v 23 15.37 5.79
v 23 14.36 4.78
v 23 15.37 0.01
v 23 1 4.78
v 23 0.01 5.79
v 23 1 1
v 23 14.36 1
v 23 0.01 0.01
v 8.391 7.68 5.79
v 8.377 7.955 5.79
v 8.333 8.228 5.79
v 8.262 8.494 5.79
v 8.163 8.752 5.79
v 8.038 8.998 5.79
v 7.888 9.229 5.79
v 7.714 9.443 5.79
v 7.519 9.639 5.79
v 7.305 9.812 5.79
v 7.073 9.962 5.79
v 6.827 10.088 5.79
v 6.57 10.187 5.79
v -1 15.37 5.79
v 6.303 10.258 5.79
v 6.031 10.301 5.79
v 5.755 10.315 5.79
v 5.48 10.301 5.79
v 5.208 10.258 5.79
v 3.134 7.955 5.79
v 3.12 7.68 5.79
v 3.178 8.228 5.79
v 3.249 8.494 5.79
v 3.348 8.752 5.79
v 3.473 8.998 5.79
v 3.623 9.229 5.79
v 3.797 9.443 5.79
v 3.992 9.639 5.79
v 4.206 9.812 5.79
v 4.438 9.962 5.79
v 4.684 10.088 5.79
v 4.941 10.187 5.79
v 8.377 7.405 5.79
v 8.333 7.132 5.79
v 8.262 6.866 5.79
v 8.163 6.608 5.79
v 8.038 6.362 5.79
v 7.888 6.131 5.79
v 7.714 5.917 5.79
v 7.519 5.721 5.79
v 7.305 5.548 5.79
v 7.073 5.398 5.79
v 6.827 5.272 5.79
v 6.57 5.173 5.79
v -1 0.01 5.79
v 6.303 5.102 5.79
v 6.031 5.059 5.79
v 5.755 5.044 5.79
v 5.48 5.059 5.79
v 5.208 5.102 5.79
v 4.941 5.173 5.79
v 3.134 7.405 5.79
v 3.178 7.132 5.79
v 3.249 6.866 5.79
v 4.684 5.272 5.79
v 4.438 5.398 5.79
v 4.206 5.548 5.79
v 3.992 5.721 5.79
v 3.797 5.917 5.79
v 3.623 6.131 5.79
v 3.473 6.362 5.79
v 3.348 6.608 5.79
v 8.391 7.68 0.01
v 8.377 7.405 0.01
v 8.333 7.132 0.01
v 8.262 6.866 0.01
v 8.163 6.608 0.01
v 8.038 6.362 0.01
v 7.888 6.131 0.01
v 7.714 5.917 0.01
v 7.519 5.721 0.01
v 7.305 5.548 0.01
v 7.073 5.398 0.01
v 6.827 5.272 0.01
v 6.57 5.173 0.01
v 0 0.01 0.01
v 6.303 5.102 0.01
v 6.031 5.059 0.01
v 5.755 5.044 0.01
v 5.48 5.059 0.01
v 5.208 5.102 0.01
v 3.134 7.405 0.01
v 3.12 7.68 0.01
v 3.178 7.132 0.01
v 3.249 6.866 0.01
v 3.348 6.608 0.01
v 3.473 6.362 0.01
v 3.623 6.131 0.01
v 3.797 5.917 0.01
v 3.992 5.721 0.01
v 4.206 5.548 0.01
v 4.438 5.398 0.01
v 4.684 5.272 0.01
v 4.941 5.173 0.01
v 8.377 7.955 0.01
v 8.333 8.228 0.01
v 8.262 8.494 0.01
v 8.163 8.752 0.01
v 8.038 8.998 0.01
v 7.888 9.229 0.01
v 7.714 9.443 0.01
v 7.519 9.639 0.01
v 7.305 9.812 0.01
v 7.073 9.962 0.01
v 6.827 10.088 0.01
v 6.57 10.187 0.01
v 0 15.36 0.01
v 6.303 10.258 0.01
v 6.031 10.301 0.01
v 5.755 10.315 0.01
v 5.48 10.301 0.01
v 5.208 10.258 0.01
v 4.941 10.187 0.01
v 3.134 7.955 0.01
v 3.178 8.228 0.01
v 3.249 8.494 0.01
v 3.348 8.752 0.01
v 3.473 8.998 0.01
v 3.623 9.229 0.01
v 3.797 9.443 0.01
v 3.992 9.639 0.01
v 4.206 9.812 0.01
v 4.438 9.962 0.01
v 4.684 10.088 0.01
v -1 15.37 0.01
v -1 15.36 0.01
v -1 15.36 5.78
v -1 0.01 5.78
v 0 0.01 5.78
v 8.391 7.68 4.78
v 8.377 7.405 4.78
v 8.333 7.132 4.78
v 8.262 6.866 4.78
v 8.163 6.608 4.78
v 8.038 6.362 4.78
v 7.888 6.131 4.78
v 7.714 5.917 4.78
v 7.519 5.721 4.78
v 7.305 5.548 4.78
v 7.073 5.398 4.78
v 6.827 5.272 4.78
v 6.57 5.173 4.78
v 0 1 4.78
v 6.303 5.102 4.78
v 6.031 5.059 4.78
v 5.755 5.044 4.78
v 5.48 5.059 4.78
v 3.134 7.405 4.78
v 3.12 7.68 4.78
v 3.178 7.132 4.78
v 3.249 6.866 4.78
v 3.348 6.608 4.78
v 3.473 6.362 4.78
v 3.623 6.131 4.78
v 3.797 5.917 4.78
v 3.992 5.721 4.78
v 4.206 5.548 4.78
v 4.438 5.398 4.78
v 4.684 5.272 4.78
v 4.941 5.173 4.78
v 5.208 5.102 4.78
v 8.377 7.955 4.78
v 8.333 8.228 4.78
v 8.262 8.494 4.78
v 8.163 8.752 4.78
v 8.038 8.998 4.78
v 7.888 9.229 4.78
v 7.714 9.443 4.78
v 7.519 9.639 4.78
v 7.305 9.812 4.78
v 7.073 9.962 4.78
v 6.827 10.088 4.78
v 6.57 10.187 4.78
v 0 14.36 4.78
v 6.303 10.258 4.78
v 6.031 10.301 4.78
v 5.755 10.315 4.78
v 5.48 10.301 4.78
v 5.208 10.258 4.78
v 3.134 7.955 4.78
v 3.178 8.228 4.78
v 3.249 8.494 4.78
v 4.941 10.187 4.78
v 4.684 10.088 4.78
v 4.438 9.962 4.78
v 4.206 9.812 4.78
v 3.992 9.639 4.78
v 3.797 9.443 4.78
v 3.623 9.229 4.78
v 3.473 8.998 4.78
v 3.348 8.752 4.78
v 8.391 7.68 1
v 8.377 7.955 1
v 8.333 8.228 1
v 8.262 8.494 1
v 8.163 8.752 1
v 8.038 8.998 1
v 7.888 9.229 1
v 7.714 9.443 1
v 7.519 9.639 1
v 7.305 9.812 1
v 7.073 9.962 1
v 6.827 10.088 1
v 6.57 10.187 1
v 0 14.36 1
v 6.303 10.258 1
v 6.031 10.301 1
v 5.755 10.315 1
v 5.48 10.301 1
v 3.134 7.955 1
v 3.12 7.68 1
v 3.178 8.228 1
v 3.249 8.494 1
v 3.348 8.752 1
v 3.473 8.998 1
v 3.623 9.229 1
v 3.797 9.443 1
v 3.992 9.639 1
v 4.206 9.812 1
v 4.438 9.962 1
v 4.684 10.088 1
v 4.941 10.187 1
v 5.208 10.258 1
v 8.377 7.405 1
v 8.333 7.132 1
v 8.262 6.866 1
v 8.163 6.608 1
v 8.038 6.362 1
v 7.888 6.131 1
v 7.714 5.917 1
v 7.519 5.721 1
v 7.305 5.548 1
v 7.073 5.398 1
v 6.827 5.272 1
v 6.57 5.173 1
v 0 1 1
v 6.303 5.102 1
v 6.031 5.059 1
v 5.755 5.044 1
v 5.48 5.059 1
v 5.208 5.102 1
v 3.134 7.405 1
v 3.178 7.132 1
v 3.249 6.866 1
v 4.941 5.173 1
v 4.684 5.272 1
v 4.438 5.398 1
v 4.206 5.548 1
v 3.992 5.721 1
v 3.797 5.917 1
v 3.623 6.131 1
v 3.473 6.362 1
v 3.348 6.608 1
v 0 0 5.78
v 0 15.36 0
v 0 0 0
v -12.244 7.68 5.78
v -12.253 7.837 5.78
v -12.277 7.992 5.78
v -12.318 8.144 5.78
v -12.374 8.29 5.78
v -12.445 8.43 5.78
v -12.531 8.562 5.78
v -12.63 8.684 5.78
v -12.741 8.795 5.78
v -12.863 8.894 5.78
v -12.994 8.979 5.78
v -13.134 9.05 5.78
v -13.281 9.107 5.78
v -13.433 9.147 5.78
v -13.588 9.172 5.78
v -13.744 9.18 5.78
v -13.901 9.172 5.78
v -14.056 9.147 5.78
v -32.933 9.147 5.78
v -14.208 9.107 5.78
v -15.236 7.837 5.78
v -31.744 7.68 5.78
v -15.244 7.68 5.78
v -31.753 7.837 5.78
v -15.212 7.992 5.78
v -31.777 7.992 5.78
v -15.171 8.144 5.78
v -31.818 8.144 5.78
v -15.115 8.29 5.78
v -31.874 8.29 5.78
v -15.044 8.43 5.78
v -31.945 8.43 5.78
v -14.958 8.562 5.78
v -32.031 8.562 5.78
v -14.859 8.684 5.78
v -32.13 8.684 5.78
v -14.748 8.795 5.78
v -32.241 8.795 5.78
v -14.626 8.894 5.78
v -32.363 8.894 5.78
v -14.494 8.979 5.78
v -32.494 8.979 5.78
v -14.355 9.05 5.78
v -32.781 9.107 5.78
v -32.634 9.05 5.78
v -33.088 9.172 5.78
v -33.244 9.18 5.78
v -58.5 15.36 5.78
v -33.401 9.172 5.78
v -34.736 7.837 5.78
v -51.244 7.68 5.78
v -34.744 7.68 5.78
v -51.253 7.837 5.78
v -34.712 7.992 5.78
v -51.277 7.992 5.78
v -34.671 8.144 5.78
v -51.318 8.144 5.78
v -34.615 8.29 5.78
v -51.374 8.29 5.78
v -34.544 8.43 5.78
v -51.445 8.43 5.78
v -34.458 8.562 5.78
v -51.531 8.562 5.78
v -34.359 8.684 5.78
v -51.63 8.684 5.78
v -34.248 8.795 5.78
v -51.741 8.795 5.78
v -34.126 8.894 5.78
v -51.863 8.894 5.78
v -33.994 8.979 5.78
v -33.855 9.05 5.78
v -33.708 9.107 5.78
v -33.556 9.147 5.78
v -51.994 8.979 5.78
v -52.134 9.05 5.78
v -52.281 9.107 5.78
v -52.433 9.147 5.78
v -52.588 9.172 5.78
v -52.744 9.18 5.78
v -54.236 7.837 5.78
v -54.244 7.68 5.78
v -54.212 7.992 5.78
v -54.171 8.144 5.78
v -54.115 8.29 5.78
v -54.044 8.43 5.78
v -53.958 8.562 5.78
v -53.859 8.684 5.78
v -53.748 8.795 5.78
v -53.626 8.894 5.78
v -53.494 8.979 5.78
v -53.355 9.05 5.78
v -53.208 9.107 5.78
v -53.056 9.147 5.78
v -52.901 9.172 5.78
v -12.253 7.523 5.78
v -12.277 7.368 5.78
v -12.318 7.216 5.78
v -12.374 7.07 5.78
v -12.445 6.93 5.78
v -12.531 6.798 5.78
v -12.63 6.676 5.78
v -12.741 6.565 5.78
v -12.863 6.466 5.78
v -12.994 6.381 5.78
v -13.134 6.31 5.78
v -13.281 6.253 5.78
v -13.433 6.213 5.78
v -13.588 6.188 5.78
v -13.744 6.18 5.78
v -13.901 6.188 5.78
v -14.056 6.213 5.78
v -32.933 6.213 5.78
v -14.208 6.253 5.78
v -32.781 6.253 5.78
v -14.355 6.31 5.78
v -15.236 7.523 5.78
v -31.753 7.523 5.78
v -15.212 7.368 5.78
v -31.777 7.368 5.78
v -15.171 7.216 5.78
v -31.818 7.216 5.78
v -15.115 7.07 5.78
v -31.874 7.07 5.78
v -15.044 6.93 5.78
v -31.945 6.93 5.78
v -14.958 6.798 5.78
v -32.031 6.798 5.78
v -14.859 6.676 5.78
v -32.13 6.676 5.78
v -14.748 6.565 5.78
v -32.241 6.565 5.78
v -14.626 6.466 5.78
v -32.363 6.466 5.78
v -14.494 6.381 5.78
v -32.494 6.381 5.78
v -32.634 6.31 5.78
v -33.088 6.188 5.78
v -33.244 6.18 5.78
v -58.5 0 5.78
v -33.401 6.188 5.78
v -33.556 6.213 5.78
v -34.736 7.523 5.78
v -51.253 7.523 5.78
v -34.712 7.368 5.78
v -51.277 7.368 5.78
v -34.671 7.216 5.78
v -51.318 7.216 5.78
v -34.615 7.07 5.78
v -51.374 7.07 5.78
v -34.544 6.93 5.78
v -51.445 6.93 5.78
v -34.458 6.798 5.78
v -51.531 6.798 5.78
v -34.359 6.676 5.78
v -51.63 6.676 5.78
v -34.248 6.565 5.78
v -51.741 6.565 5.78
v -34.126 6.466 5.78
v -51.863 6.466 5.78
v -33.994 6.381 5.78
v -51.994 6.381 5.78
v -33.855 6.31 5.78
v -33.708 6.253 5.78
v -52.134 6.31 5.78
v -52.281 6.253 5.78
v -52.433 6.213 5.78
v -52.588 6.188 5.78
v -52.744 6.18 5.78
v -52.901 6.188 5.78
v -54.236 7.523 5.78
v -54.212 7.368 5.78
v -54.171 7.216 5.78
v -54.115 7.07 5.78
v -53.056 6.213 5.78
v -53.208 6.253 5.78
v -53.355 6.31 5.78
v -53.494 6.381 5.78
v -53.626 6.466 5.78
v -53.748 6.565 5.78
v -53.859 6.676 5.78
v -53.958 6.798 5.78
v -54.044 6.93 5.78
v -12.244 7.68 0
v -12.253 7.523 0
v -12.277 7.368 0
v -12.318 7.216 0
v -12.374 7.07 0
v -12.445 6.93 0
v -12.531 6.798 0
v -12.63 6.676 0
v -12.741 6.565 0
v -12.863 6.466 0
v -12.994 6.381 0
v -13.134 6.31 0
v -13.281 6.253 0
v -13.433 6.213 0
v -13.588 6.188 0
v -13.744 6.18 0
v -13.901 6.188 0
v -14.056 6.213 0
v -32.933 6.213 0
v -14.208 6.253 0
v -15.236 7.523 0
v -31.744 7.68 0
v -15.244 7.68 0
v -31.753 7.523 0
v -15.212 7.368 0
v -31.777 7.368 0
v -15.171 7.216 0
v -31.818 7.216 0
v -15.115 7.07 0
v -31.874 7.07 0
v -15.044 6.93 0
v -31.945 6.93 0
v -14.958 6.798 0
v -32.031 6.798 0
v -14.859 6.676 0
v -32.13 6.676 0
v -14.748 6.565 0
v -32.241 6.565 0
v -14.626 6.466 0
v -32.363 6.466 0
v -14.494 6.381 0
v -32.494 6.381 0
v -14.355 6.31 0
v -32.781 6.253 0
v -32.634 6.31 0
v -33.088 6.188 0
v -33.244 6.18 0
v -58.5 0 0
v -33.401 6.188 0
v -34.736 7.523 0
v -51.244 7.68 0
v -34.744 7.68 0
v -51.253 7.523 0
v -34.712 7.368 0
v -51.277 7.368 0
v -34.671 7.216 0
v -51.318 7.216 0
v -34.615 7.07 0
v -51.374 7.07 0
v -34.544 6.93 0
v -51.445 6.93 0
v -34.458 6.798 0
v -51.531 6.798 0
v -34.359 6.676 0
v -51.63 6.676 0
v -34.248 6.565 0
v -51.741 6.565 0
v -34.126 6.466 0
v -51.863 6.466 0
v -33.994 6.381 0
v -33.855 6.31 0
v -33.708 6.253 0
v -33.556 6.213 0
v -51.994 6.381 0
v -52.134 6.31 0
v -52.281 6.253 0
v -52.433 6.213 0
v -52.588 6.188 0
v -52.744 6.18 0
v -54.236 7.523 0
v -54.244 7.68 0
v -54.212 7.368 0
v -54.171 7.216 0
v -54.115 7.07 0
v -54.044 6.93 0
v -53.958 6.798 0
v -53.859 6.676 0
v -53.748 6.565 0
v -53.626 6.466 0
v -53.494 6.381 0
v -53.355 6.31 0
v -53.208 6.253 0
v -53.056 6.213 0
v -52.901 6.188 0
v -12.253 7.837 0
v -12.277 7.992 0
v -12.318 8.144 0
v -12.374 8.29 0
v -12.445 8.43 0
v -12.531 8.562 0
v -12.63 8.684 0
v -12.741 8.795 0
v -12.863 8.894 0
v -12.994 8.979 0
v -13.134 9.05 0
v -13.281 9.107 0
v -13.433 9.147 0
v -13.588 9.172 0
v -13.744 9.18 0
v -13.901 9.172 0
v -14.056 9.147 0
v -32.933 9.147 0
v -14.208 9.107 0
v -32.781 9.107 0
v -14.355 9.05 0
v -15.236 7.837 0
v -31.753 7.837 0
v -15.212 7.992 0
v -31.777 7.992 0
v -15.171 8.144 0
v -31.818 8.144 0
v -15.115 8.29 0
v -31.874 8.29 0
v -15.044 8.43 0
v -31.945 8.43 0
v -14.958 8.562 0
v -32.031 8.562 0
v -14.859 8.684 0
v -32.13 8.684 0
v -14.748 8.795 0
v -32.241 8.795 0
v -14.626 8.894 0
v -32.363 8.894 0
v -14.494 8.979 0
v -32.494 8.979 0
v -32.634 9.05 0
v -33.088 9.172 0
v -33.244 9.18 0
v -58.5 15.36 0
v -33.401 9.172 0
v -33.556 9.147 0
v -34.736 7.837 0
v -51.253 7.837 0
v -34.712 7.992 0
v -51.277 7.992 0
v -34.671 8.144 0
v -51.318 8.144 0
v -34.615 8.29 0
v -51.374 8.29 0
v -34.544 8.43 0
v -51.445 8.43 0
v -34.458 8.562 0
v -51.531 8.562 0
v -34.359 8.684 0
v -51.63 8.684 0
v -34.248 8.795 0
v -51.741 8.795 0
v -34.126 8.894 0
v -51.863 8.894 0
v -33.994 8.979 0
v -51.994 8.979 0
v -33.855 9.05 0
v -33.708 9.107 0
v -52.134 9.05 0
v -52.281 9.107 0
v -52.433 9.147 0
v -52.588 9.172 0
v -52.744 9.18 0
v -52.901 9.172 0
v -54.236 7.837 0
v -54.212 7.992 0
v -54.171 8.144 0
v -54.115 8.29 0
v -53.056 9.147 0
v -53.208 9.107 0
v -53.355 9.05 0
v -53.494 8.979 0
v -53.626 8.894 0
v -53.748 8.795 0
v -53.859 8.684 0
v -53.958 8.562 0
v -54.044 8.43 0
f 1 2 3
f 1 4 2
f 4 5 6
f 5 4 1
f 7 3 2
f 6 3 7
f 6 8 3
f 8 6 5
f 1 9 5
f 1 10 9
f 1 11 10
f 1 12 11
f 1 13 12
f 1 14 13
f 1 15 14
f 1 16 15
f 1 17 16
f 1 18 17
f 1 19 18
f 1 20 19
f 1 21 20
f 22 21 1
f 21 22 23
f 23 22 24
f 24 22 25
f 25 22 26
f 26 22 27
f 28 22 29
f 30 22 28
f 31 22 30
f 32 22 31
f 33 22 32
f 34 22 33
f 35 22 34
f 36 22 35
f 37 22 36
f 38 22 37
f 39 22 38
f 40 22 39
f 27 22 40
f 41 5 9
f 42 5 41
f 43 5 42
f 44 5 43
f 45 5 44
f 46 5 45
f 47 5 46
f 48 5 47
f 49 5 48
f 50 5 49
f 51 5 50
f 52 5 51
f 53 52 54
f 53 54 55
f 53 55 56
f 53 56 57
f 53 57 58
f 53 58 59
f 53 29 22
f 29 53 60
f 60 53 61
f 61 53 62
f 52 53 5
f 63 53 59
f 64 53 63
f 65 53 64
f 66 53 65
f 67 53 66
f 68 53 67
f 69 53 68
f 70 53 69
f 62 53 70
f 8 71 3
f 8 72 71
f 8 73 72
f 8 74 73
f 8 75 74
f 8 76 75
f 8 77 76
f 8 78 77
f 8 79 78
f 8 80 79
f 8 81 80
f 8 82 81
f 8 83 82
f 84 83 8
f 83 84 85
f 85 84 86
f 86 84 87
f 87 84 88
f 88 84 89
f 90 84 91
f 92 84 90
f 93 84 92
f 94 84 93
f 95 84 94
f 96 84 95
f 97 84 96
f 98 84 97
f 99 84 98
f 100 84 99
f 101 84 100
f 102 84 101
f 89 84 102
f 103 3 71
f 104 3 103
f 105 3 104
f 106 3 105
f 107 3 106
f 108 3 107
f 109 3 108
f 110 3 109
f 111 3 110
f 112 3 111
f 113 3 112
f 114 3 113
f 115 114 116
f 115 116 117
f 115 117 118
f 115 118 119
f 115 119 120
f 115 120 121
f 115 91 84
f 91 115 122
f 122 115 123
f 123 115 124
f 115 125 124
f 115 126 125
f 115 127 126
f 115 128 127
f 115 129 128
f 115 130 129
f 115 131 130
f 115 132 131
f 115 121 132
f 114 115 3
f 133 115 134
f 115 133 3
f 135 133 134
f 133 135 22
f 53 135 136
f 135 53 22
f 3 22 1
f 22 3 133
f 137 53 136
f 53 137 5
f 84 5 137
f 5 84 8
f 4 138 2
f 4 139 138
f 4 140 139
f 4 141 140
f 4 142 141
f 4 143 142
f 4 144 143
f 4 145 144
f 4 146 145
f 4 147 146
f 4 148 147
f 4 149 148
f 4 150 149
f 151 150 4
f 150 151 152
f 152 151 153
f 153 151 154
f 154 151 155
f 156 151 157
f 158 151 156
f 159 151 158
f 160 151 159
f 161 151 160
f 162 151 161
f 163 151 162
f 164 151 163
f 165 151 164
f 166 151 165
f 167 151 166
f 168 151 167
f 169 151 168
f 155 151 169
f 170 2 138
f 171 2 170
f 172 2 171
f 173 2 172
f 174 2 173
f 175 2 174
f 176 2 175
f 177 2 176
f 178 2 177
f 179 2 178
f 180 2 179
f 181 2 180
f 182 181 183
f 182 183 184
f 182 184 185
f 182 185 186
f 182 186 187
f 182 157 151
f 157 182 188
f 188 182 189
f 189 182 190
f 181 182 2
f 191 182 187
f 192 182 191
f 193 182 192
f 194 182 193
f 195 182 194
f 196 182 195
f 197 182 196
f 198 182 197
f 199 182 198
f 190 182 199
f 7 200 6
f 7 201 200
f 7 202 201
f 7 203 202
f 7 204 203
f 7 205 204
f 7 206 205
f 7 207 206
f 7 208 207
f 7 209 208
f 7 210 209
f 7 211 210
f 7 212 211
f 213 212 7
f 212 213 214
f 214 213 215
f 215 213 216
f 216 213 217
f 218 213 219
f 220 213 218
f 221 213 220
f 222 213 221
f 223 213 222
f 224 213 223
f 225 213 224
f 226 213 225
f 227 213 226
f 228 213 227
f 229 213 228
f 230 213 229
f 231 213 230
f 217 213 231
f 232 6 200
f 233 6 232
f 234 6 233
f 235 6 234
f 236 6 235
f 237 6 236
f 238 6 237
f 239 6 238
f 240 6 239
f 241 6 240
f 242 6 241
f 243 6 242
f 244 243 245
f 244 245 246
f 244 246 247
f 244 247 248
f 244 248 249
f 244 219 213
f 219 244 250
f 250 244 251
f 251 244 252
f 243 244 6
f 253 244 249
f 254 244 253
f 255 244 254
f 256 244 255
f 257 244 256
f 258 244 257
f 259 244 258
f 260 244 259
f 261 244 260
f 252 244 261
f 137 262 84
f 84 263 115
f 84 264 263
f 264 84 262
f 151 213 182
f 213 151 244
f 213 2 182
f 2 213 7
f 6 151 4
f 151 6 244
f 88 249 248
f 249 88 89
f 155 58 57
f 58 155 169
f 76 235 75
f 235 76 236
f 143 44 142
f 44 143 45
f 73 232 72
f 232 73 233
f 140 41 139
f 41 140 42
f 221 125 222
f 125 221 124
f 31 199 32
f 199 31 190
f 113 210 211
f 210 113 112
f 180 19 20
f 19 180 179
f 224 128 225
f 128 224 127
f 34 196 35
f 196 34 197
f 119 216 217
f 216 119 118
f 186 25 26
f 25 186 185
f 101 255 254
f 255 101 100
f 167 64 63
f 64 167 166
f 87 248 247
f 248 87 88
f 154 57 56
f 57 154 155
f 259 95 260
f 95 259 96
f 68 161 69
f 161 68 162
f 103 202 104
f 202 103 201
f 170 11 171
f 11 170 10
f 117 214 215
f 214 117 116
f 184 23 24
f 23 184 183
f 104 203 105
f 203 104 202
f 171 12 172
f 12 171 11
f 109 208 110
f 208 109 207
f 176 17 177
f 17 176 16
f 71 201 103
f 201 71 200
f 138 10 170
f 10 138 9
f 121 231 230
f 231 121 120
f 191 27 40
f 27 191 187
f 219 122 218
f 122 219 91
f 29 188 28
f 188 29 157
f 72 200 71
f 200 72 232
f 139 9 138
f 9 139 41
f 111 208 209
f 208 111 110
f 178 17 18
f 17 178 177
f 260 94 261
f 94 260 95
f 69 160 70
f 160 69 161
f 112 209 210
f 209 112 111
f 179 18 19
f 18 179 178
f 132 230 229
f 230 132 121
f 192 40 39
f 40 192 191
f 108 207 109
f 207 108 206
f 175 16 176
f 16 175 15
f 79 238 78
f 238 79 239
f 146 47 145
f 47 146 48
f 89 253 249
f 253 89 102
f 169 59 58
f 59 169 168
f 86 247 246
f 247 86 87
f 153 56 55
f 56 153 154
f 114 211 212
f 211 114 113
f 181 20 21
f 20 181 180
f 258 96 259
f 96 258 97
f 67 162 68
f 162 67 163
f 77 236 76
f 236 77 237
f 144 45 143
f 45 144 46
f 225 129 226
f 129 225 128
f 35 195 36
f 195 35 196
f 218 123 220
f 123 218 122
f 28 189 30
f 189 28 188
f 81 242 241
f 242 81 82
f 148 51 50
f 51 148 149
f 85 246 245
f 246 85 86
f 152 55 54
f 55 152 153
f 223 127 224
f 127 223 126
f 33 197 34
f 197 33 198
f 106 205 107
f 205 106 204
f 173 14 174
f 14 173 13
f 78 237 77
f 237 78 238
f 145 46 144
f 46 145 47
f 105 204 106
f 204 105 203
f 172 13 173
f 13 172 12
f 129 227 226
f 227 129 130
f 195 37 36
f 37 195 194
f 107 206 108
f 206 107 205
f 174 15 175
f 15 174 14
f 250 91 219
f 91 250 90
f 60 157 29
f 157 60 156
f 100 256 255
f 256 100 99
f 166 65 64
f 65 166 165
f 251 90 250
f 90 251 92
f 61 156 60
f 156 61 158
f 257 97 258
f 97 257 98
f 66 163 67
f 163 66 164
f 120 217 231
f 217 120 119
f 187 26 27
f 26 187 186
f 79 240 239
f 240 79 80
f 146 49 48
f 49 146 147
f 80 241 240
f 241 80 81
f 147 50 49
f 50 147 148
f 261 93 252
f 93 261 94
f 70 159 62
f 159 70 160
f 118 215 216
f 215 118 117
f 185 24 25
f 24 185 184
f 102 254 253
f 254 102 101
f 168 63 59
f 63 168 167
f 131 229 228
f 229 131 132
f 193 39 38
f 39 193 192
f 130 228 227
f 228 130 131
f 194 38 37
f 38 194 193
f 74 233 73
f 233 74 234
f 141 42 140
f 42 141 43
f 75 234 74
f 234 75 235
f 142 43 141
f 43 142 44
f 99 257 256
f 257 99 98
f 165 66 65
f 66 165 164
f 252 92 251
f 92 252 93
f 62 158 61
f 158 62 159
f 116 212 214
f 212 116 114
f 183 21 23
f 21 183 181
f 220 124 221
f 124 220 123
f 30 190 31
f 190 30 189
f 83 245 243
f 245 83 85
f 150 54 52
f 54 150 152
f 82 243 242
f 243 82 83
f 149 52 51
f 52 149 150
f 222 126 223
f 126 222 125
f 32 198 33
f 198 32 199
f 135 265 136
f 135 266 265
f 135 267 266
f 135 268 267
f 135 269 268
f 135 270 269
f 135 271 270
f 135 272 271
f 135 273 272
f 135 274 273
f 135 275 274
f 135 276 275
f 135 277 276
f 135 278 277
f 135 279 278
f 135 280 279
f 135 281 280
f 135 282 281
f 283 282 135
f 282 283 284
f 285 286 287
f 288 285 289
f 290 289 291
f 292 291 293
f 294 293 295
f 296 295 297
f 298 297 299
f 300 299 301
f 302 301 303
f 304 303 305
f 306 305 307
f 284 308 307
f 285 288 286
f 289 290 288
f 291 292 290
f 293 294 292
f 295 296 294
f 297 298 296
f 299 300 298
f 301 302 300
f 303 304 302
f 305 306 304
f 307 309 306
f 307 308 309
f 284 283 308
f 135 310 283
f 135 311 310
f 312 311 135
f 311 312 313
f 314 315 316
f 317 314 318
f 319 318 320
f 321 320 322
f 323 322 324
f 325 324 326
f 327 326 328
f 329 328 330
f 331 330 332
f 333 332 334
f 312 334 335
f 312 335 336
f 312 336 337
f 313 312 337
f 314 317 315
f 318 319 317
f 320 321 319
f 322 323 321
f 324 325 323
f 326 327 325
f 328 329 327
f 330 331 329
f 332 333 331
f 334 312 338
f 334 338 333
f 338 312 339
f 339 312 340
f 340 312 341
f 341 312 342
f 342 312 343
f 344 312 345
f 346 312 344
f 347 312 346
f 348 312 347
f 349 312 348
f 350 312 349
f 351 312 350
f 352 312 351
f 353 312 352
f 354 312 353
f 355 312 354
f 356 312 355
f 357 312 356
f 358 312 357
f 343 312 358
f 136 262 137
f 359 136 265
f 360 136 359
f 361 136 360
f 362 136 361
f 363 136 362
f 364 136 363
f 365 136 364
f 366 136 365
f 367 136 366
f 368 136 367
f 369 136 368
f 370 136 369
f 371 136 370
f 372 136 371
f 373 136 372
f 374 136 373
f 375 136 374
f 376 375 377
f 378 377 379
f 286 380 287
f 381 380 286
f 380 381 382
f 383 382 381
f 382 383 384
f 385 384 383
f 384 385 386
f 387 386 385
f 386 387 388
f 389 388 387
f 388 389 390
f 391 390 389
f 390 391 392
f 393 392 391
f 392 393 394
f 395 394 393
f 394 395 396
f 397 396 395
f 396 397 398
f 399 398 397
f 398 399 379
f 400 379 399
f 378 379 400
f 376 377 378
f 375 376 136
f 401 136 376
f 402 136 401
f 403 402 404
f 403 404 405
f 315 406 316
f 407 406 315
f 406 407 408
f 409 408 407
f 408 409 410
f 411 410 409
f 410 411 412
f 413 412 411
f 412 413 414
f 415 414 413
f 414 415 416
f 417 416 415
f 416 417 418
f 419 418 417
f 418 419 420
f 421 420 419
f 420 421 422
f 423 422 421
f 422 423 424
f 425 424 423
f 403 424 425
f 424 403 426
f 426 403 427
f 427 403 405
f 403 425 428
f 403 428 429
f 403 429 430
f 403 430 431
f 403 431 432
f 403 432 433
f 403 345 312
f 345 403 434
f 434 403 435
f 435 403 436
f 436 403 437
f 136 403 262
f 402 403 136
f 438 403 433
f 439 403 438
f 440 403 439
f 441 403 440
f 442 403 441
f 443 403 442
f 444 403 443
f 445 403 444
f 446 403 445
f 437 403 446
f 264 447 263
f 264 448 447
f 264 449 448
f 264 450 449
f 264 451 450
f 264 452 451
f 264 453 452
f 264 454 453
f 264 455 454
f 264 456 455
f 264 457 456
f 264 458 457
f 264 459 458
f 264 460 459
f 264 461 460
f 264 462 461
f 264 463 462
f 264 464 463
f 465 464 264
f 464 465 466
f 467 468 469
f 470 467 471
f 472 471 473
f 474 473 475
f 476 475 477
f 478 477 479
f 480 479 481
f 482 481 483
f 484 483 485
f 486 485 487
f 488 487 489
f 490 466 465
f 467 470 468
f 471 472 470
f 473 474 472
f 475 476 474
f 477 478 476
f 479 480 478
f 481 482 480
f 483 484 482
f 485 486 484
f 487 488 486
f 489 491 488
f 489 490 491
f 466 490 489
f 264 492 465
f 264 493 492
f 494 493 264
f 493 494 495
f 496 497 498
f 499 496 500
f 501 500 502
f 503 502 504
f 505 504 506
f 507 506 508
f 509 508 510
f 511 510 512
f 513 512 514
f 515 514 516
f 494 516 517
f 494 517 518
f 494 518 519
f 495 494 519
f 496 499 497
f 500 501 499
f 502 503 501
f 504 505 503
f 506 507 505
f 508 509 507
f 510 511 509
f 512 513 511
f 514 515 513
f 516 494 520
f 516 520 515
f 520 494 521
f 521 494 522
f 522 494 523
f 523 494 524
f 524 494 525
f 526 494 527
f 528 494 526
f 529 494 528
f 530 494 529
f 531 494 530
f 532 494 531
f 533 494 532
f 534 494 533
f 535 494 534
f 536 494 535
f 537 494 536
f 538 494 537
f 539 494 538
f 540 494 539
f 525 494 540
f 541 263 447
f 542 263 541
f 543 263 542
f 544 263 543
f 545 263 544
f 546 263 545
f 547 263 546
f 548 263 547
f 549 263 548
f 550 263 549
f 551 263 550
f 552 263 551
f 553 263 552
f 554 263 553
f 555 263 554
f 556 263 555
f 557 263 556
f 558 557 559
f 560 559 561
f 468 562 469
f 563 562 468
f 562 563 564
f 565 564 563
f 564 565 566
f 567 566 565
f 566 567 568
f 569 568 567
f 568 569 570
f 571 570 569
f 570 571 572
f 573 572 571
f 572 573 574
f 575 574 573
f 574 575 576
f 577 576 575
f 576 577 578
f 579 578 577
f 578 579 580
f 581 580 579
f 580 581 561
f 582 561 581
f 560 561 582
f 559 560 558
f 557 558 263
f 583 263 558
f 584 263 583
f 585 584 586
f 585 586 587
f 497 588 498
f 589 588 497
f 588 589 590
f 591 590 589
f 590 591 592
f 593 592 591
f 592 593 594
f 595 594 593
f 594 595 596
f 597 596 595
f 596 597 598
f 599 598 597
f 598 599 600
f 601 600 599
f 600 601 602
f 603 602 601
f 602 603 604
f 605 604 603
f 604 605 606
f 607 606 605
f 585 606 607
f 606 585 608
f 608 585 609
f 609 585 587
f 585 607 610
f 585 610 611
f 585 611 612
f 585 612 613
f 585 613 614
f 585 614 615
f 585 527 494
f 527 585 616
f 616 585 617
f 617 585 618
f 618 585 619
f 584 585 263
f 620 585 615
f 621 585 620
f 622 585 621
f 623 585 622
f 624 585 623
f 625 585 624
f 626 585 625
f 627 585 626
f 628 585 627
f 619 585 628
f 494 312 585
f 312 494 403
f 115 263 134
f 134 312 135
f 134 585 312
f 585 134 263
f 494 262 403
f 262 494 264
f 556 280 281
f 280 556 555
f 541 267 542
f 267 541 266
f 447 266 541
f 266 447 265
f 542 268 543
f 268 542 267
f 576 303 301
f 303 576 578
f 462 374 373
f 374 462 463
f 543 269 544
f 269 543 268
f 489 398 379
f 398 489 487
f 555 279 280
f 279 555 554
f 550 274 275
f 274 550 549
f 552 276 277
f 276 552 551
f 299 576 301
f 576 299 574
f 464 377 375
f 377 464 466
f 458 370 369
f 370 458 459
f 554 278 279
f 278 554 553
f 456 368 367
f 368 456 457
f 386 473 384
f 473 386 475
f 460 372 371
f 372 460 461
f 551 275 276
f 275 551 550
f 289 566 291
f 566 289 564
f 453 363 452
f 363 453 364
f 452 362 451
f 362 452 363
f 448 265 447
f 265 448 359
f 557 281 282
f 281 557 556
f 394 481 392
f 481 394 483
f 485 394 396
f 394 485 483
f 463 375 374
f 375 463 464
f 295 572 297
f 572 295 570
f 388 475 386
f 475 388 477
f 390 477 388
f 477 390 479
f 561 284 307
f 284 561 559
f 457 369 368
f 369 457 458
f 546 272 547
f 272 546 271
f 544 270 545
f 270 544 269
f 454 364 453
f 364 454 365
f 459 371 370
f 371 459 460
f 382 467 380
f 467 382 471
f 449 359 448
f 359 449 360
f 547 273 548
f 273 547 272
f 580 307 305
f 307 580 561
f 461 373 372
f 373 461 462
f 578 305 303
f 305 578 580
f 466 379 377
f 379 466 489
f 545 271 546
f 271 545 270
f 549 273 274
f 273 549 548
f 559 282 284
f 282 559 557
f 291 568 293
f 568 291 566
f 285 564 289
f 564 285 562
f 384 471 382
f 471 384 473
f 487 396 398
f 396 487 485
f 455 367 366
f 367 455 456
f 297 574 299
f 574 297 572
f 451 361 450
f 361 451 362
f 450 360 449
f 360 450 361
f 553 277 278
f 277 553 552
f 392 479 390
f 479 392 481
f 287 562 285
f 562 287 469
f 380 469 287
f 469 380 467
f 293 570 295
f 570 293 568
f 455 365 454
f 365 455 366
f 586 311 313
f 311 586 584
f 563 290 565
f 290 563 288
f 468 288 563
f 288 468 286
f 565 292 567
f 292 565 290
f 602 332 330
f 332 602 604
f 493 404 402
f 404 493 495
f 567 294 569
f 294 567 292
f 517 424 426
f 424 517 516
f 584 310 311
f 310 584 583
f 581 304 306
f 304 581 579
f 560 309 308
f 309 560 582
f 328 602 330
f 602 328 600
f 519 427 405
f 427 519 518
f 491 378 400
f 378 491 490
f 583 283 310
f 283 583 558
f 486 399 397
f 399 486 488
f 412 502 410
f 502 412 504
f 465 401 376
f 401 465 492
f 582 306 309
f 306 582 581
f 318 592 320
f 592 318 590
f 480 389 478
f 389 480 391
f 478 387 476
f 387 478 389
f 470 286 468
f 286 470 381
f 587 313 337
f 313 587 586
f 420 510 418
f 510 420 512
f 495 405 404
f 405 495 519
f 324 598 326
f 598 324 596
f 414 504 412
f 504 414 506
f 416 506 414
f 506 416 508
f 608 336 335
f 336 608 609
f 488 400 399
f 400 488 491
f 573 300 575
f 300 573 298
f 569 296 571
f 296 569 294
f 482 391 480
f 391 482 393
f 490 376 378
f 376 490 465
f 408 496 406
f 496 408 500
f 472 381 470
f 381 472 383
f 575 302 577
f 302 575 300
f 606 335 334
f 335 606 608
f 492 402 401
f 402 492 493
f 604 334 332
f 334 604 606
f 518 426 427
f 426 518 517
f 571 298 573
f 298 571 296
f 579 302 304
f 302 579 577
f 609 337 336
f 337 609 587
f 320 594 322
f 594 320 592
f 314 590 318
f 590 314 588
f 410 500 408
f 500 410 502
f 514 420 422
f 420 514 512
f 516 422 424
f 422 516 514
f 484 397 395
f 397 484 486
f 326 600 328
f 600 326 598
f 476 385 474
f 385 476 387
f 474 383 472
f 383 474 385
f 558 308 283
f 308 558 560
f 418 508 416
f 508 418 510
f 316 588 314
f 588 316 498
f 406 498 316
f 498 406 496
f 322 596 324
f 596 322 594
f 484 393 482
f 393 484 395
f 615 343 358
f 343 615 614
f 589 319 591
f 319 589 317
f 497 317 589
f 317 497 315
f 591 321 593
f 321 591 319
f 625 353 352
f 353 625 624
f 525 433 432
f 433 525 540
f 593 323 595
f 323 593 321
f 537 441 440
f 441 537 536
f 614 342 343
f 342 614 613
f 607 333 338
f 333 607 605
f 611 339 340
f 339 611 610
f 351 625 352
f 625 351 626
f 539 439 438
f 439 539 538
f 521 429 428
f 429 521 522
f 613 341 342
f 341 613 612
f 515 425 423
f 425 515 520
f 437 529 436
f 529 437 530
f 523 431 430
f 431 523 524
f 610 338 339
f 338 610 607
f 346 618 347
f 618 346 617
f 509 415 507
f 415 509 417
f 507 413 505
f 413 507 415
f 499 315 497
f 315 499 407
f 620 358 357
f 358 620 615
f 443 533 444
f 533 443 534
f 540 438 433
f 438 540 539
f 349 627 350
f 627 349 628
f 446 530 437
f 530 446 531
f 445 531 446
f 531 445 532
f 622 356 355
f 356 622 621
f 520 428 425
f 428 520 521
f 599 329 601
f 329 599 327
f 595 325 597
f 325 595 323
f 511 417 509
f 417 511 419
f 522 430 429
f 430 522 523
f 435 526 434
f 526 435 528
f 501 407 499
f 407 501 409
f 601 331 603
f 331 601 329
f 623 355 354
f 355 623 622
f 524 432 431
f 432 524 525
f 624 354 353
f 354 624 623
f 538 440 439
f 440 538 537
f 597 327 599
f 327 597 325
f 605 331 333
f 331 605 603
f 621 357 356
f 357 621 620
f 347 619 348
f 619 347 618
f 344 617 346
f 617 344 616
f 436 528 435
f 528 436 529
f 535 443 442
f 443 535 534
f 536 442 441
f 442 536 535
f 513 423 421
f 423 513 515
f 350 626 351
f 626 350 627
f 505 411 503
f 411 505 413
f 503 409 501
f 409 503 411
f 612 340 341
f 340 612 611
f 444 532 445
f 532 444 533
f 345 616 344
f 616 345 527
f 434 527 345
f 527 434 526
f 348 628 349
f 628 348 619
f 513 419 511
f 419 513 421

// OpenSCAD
bar_x = 16 + 8;
bar_y = 12.86 + 0.5;
bar_z = 3.28 + 0.5;
d_1428 = 5.271;
hole_x_translation=3.12 + d_1428/2;
K=0.01;
$fn=60;

wall_thickness = 1;
guide_x = bar_x;
guide_y = bar_y + 2*wall_thickness; 
guide_z = bar_z + 2*wall_thickness;

x_between_wells = 19.5;
needle_diameter = 3;
module needle_guide(){
        cube([guide_x, guide_y, guide_z]);

}

hole_translation = [hole_x_translation, guide_y/2, 0];
module bar(){
    difference(){
        union(){
            translate([-3*x_between_wells, 0,0]) cube([3*x_between_wells, guide_y, guide_z]);
            difference(){
                translate([-1,K,K]) needle_guide();
                translate([0, wall_thickness, wall_thickness]) cube([bar_x, bar_y, bar_z]);
                translate(hole_translation) hole_1428();
                }
            }
            holes_for_needles();

        }
    }
module hole_for_needle(){
        
                rotate([0,0,0]){
                    translate(hole_translation) translate([0,0, -guide_z/2]) cylinder(h=2*guide_z, d=needle_diameter);
                    }
   
    }

module holes_for_needles(){
    for(i=[0:3]){
//        echo(i*x_between_wells)
        translate([-i*x_between_wells,0,0]) {
            hole_for_needle();
            }
            
        }
}

module hole_1428(){
    cylinder(d=d_1428, h = 5*bar_z);
}

bar(); 
//color([1,1,0,0.5]) needle_guide();
//holes_for_needles();
